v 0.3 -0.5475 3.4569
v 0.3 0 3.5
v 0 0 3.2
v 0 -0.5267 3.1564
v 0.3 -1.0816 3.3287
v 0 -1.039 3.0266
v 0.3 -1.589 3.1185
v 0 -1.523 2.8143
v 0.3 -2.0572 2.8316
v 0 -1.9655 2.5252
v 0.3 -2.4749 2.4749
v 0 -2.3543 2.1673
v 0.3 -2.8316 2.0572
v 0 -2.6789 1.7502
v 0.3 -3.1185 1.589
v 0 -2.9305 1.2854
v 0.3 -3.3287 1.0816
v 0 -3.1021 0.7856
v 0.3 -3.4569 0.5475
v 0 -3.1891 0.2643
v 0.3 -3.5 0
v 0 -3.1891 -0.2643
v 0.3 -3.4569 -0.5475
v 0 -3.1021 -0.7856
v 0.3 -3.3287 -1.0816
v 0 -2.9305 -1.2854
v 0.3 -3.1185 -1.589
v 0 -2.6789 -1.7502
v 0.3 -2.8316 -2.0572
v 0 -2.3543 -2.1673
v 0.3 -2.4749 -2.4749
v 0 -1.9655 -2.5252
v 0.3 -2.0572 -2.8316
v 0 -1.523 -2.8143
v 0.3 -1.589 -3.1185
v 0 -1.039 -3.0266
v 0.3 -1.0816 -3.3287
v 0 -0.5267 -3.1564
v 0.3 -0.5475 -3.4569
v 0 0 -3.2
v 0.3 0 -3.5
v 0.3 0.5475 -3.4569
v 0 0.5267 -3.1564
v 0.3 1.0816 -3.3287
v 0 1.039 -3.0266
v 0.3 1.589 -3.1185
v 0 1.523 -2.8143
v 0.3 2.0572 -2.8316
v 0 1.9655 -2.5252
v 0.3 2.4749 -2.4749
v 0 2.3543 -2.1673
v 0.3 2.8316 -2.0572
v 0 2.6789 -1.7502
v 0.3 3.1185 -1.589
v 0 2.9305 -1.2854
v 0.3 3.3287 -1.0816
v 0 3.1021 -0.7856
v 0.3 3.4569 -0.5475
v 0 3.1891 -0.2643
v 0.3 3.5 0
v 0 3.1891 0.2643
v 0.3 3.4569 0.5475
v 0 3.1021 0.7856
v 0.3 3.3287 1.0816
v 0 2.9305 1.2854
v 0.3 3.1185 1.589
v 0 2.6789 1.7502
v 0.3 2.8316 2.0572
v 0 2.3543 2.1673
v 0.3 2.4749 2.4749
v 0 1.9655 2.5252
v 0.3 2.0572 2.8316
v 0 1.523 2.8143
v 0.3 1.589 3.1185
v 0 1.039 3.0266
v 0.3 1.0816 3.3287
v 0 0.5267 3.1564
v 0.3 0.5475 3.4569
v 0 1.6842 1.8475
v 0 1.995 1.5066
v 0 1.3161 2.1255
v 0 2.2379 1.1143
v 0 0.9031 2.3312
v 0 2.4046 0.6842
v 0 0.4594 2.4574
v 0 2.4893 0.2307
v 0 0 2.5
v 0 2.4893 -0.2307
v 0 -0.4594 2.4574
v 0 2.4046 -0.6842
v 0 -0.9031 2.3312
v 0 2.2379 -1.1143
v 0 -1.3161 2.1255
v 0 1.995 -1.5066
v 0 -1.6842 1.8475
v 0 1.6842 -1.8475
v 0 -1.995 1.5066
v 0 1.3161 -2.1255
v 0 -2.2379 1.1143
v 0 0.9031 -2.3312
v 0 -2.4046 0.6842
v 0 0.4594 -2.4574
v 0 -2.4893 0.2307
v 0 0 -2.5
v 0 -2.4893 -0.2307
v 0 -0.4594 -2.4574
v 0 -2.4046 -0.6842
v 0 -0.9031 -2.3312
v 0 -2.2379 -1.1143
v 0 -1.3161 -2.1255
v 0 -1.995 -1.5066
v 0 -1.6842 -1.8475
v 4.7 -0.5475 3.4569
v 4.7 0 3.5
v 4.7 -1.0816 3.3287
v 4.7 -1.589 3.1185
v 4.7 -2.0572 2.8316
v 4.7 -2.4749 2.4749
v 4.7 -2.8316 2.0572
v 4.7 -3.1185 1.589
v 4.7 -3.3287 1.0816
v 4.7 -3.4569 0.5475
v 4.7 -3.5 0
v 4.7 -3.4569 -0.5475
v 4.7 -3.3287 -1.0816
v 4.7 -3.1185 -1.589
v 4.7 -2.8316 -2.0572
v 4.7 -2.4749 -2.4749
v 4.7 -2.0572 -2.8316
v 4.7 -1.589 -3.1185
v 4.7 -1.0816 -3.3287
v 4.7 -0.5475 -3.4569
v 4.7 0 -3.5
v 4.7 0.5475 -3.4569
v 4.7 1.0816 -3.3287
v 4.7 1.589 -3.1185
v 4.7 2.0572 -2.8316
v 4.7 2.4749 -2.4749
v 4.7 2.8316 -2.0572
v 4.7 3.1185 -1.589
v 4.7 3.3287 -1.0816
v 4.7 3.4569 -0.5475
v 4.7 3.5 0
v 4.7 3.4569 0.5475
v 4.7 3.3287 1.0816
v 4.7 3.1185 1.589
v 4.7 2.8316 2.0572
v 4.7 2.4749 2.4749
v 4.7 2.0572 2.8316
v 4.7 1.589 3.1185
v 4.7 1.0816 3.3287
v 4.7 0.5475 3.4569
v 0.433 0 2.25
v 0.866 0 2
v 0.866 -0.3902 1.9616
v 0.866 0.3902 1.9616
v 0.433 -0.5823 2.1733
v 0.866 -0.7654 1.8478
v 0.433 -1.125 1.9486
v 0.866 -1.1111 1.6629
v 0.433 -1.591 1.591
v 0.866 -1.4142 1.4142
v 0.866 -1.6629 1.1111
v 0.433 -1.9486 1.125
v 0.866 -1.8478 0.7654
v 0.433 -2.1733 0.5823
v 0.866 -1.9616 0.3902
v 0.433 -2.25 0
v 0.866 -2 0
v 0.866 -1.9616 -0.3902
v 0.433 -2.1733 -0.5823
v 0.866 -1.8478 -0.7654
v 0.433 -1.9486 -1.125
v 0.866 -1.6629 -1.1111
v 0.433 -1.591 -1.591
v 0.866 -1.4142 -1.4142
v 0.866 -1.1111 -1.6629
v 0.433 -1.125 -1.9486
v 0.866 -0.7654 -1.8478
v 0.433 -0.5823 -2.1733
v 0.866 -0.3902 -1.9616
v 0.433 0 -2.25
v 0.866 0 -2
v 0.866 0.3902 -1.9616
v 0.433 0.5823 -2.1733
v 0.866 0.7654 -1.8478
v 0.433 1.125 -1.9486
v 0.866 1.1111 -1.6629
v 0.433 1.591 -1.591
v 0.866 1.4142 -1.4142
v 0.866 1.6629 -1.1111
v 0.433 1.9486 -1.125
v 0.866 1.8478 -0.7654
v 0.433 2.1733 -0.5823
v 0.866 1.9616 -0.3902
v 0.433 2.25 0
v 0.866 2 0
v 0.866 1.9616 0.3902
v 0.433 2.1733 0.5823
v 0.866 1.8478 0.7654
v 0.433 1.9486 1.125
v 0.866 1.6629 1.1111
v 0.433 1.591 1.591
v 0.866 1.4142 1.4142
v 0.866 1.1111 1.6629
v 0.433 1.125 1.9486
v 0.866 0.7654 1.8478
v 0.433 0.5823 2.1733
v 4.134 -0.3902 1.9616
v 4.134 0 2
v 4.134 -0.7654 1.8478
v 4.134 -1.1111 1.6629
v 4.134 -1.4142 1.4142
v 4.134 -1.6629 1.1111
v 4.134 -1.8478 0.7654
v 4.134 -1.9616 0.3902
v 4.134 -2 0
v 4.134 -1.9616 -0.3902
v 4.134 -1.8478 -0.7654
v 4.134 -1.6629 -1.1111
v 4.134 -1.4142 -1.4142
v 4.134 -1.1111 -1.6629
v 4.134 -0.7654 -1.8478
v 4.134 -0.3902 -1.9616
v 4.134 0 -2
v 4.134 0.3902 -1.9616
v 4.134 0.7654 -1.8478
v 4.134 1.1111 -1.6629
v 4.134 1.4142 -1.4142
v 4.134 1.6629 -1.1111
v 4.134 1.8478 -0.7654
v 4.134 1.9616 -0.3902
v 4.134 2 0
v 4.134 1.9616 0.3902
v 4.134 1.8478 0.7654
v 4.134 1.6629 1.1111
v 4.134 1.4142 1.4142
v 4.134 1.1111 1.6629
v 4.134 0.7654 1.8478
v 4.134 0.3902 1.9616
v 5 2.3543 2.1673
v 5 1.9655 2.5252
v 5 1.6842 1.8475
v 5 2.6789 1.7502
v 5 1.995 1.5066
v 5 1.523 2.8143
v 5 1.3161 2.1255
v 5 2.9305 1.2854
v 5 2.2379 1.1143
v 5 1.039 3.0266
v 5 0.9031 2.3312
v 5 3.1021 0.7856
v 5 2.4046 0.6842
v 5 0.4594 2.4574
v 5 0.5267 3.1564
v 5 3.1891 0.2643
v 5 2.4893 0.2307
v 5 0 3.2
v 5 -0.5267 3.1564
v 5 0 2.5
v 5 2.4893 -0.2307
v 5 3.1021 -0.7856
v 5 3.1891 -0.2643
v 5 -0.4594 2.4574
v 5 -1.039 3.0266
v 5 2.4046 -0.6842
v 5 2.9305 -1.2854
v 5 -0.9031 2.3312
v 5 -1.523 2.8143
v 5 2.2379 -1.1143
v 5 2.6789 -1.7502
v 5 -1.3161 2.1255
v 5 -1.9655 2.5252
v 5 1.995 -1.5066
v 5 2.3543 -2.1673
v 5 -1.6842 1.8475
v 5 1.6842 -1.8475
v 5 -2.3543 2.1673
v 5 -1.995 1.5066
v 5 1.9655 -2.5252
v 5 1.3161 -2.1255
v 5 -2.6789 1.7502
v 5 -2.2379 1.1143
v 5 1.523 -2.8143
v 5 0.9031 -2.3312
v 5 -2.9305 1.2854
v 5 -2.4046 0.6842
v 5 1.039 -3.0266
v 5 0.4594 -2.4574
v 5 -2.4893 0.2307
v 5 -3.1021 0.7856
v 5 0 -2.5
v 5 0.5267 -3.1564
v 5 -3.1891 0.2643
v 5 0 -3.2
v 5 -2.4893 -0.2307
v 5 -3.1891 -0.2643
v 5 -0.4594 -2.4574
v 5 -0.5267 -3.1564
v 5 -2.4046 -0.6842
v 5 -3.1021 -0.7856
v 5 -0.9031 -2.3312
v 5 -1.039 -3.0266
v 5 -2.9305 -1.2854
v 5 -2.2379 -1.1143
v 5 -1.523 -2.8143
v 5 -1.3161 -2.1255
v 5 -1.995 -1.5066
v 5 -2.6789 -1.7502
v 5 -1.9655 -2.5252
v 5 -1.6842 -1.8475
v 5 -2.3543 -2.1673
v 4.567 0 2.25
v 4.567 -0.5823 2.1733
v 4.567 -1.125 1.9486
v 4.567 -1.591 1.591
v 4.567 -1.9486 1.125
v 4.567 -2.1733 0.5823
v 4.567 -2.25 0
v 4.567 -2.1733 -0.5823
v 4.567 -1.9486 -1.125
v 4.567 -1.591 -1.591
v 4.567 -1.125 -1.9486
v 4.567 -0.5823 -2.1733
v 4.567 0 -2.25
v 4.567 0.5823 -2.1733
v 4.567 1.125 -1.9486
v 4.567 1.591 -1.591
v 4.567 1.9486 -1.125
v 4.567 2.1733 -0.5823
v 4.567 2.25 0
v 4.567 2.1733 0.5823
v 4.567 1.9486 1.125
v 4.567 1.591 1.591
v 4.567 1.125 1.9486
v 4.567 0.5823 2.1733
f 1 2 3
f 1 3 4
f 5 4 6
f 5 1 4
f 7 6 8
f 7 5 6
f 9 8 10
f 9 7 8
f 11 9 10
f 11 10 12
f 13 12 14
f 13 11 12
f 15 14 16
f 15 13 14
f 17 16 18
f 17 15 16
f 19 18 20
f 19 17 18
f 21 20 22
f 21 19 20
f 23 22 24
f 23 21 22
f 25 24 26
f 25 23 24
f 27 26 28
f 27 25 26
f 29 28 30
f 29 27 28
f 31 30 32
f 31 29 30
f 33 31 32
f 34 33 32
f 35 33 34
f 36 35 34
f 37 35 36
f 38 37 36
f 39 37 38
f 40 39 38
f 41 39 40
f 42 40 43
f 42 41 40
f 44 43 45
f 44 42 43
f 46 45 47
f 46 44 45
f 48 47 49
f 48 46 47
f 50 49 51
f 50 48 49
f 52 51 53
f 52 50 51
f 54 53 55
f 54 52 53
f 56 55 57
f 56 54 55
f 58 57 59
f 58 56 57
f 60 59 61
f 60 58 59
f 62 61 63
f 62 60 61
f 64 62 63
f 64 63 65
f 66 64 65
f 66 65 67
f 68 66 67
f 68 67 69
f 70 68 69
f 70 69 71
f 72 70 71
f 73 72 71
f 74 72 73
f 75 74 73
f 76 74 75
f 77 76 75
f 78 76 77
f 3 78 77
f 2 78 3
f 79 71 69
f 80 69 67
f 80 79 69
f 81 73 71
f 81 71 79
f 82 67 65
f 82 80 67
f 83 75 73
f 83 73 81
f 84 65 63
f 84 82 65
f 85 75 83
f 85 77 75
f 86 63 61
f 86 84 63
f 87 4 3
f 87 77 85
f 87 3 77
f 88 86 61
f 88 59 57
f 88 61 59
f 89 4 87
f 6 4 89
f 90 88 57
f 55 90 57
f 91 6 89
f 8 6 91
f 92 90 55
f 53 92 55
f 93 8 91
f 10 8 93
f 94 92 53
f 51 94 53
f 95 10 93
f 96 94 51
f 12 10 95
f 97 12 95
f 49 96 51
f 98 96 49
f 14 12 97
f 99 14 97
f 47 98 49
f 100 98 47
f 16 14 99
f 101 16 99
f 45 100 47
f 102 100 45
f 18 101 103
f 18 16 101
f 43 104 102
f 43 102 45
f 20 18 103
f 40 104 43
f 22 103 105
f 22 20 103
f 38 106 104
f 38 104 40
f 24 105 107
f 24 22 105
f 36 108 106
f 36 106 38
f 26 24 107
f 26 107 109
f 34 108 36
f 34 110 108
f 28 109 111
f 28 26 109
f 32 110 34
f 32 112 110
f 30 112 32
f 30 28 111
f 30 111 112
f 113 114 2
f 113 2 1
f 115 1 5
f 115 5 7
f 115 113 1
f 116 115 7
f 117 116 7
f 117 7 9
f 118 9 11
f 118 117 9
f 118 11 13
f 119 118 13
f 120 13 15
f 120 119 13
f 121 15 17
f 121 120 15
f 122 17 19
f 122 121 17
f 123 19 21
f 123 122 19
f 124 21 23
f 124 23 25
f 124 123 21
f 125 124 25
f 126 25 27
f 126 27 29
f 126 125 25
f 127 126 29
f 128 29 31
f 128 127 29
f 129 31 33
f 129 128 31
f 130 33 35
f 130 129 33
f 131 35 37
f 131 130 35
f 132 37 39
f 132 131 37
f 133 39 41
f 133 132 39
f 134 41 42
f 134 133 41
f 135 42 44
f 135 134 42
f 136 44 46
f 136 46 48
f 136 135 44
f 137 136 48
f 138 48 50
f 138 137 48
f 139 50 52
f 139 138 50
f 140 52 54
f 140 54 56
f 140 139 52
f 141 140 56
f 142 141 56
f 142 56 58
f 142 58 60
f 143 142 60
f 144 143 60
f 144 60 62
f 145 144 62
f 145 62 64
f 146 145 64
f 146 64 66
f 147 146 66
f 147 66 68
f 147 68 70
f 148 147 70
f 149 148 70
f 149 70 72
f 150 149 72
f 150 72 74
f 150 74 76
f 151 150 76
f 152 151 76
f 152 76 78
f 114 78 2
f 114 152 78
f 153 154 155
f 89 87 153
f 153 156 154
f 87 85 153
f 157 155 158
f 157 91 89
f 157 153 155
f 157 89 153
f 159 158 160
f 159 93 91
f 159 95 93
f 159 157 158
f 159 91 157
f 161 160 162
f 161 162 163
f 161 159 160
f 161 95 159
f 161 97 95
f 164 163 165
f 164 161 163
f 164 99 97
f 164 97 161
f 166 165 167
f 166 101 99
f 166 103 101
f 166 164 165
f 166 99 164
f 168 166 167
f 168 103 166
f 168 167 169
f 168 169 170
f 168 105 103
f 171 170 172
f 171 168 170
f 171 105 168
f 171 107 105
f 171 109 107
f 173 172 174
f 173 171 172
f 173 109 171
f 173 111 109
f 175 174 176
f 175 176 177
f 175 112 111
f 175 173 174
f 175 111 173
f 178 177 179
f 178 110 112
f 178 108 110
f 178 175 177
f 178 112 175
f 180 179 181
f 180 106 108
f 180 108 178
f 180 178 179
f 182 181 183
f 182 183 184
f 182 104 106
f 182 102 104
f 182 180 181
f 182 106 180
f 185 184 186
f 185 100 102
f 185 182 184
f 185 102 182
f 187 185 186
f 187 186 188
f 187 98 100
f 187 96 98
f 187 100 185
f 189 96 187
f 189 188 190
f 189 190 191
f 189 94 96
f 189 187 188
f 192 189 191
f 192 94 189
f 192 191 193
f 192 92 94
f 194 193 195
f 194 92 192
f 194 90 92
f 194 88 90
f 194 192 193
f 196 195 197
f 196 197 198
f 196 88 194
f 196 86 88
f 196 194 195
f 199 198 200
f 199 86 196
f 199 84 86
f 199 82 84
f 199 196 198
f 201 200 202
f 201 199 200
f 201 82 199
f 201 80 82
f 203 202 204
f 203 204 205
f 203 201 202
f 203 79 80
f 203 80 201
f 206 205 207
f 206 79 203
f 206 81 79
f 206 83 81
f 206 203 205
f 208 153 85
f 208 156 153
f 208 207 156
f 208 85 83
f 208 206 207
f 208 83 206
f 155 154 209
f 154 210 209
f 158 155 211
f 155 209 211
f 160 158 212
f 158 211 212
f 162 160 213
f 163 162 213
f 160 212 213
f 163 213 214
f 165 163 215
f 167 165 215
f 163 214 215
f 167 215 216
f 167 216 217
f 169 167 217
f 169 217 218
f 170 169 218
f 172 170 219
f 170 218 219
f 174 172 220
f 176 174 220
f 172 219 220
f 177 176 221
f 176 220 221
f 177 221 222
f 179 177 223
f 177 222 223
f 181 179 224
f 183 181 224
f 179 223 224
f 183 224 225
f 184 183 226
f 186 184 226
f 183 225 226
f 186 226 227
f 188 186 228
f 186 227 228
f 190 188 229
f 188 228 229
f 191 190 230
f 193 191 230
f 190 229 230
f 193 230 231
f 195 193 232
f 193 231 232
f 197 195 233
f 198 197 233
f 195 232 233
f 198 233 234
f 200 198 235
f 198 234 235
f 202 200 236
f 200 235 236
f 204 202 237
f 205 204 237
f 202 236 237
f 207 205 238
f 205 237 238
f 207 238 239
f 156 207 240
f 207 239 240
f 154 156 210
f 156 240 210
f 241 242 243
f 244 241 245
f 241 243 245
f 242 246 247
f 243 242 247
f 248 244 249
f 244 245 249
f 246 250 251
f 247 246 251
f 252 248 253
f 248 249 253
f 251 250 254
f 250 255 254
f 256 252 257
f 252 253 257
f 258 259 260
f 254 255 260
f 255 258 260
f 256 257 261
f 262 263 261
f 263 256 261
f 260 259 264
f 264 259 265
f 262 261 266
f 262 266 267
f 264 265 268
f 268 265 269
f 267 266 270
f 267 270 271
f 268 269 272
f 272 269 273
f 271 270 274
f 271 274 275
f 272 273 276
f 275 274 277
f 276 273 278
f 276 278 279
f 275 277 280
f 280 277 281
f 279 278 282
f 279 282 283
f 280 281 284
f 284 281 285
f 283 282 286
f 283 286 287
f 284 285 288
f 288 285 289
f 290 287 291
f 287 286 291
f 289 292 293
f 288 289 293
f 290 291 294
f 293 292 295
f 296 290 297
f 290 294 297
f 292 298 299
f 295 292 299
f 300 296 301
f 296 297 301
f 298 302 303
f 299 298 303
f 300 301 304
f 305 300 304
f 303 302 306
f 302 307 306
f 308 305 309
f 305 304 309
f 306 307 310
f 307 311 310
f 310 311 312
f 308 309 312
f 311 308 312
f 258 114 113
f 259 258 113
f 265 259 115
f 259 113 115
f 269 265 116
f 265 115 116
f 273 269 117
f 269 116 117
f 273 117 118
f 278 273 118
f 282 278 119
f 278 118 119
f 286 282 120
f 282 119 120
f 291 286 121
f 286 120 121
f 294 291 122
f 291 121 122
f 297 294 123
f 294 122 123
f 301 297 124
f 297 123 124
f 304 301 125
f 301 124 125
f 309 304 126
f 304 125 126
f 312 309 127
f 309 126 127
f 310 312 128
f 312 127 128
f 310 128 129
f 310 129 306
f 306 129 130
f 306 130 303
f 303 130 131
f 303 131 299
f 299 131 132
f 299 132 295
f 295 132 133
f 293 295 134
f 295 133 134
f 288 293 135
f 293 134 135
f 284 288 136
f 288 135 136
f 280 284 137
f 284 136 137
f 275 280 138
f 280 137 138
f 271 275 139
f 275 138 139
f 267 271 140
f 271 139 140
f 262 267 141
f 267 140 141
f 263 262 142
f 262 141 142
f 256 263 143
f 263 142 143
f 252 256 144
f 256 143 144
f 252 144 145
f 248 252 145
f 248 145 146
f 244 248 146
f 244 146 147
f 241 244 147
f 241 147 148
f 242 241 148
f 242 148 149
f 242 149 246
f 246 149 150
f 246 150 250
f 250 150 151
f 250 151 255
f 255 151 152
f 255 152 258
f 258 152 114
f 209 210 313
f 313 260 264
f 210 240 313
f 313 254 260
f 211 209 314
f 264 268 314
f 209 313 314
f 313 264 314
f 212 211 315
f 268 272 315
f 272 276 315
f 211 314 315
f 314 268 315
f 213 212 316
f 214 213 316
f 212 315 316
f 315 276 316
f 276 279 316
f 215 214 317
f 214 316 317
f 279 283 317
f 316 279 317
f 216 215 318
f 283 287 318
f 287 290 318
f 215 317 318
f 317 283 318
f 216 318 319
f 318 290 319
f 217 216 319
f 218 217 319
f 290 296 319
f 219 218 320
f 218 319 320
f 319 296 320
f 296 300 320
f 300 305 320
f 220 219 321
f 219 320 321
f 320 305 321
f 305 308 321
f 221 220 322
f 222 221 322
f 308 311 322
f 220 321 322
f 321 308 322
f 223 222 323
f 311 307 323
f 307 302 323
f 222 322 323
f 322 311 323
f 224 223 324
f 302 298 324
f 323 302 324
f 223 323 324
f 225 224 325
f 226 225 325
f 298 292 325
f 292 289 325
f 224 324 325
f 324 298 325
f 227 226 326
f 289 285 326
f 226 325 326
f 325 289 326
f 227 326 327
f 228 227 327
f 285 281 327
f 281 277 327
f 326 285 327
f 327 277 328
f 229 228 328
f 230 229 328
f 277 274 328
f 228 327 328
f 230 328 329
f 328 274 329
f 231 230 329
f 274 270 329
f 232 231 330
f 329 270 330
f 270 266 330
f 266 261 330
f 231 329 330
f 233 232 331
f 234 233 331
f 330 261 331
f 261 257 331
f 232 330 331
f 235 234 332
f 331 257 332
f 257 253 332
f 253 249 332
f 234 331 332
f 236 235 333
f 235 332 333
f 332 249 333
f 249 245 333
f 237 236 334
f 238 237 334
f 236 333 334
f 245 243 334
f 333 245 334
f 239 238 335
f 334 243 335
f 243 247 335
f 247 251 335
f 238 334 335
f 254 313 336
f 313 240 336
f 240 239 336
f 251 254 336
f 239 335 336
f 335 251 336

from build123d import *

# Parameters (mm, degrees)
SKETCH1_W     = 5
SKETCH1_H     = 1.5
CHAMFER1_SIZE = 0.3


with BuildPart() as part:
    # Sketch1 → Revolve1 (revolve)
    with BuildSketch(Plane.XY, mode=Mode.PRIVATE) as revolve1_sk:
        with Locations((2.5, 2.75)):
            Rectangle(SKETCH1_W, SKETCH1_H)
    revolve(revolve1_sk.sketch.rotate(Axis((0, 0, 0), (1, 0, 0)), 90), axis=Axis((0, 0, 0), (1, 0, 0)))

    # Chamfer1
    chamfer1_edges = [part.edges().sort_by_distance(p)[0] for p in [
        (5, 0, -3.5),
        (0, 0, -3.5),
    ]]
    chamfer(chamfer1_edges, length=CHAMFER1_SIZE)

    # Sketch2 → Cut-Revolve1 (revolve, cut)
    with BuildSketch(Plane.XY, mode=Mode.PRIVATE) as cut_revolve1_sk:
        Polygon((0, 2.5), (0, 2), (0.866025404, 2), align=None)
        Polygon((4.133974596, 2), (5, 2.5), (5, 2), align=None)
    revolve(cut_revolve1_sk.sketch.rotate(Axis((0, 0, 0), (1, 0, 0)), 90), axis=Axis((0, 0, 0), (1, 0, 0)), mode=Mode.SUBTRACT)


solid = part.part
